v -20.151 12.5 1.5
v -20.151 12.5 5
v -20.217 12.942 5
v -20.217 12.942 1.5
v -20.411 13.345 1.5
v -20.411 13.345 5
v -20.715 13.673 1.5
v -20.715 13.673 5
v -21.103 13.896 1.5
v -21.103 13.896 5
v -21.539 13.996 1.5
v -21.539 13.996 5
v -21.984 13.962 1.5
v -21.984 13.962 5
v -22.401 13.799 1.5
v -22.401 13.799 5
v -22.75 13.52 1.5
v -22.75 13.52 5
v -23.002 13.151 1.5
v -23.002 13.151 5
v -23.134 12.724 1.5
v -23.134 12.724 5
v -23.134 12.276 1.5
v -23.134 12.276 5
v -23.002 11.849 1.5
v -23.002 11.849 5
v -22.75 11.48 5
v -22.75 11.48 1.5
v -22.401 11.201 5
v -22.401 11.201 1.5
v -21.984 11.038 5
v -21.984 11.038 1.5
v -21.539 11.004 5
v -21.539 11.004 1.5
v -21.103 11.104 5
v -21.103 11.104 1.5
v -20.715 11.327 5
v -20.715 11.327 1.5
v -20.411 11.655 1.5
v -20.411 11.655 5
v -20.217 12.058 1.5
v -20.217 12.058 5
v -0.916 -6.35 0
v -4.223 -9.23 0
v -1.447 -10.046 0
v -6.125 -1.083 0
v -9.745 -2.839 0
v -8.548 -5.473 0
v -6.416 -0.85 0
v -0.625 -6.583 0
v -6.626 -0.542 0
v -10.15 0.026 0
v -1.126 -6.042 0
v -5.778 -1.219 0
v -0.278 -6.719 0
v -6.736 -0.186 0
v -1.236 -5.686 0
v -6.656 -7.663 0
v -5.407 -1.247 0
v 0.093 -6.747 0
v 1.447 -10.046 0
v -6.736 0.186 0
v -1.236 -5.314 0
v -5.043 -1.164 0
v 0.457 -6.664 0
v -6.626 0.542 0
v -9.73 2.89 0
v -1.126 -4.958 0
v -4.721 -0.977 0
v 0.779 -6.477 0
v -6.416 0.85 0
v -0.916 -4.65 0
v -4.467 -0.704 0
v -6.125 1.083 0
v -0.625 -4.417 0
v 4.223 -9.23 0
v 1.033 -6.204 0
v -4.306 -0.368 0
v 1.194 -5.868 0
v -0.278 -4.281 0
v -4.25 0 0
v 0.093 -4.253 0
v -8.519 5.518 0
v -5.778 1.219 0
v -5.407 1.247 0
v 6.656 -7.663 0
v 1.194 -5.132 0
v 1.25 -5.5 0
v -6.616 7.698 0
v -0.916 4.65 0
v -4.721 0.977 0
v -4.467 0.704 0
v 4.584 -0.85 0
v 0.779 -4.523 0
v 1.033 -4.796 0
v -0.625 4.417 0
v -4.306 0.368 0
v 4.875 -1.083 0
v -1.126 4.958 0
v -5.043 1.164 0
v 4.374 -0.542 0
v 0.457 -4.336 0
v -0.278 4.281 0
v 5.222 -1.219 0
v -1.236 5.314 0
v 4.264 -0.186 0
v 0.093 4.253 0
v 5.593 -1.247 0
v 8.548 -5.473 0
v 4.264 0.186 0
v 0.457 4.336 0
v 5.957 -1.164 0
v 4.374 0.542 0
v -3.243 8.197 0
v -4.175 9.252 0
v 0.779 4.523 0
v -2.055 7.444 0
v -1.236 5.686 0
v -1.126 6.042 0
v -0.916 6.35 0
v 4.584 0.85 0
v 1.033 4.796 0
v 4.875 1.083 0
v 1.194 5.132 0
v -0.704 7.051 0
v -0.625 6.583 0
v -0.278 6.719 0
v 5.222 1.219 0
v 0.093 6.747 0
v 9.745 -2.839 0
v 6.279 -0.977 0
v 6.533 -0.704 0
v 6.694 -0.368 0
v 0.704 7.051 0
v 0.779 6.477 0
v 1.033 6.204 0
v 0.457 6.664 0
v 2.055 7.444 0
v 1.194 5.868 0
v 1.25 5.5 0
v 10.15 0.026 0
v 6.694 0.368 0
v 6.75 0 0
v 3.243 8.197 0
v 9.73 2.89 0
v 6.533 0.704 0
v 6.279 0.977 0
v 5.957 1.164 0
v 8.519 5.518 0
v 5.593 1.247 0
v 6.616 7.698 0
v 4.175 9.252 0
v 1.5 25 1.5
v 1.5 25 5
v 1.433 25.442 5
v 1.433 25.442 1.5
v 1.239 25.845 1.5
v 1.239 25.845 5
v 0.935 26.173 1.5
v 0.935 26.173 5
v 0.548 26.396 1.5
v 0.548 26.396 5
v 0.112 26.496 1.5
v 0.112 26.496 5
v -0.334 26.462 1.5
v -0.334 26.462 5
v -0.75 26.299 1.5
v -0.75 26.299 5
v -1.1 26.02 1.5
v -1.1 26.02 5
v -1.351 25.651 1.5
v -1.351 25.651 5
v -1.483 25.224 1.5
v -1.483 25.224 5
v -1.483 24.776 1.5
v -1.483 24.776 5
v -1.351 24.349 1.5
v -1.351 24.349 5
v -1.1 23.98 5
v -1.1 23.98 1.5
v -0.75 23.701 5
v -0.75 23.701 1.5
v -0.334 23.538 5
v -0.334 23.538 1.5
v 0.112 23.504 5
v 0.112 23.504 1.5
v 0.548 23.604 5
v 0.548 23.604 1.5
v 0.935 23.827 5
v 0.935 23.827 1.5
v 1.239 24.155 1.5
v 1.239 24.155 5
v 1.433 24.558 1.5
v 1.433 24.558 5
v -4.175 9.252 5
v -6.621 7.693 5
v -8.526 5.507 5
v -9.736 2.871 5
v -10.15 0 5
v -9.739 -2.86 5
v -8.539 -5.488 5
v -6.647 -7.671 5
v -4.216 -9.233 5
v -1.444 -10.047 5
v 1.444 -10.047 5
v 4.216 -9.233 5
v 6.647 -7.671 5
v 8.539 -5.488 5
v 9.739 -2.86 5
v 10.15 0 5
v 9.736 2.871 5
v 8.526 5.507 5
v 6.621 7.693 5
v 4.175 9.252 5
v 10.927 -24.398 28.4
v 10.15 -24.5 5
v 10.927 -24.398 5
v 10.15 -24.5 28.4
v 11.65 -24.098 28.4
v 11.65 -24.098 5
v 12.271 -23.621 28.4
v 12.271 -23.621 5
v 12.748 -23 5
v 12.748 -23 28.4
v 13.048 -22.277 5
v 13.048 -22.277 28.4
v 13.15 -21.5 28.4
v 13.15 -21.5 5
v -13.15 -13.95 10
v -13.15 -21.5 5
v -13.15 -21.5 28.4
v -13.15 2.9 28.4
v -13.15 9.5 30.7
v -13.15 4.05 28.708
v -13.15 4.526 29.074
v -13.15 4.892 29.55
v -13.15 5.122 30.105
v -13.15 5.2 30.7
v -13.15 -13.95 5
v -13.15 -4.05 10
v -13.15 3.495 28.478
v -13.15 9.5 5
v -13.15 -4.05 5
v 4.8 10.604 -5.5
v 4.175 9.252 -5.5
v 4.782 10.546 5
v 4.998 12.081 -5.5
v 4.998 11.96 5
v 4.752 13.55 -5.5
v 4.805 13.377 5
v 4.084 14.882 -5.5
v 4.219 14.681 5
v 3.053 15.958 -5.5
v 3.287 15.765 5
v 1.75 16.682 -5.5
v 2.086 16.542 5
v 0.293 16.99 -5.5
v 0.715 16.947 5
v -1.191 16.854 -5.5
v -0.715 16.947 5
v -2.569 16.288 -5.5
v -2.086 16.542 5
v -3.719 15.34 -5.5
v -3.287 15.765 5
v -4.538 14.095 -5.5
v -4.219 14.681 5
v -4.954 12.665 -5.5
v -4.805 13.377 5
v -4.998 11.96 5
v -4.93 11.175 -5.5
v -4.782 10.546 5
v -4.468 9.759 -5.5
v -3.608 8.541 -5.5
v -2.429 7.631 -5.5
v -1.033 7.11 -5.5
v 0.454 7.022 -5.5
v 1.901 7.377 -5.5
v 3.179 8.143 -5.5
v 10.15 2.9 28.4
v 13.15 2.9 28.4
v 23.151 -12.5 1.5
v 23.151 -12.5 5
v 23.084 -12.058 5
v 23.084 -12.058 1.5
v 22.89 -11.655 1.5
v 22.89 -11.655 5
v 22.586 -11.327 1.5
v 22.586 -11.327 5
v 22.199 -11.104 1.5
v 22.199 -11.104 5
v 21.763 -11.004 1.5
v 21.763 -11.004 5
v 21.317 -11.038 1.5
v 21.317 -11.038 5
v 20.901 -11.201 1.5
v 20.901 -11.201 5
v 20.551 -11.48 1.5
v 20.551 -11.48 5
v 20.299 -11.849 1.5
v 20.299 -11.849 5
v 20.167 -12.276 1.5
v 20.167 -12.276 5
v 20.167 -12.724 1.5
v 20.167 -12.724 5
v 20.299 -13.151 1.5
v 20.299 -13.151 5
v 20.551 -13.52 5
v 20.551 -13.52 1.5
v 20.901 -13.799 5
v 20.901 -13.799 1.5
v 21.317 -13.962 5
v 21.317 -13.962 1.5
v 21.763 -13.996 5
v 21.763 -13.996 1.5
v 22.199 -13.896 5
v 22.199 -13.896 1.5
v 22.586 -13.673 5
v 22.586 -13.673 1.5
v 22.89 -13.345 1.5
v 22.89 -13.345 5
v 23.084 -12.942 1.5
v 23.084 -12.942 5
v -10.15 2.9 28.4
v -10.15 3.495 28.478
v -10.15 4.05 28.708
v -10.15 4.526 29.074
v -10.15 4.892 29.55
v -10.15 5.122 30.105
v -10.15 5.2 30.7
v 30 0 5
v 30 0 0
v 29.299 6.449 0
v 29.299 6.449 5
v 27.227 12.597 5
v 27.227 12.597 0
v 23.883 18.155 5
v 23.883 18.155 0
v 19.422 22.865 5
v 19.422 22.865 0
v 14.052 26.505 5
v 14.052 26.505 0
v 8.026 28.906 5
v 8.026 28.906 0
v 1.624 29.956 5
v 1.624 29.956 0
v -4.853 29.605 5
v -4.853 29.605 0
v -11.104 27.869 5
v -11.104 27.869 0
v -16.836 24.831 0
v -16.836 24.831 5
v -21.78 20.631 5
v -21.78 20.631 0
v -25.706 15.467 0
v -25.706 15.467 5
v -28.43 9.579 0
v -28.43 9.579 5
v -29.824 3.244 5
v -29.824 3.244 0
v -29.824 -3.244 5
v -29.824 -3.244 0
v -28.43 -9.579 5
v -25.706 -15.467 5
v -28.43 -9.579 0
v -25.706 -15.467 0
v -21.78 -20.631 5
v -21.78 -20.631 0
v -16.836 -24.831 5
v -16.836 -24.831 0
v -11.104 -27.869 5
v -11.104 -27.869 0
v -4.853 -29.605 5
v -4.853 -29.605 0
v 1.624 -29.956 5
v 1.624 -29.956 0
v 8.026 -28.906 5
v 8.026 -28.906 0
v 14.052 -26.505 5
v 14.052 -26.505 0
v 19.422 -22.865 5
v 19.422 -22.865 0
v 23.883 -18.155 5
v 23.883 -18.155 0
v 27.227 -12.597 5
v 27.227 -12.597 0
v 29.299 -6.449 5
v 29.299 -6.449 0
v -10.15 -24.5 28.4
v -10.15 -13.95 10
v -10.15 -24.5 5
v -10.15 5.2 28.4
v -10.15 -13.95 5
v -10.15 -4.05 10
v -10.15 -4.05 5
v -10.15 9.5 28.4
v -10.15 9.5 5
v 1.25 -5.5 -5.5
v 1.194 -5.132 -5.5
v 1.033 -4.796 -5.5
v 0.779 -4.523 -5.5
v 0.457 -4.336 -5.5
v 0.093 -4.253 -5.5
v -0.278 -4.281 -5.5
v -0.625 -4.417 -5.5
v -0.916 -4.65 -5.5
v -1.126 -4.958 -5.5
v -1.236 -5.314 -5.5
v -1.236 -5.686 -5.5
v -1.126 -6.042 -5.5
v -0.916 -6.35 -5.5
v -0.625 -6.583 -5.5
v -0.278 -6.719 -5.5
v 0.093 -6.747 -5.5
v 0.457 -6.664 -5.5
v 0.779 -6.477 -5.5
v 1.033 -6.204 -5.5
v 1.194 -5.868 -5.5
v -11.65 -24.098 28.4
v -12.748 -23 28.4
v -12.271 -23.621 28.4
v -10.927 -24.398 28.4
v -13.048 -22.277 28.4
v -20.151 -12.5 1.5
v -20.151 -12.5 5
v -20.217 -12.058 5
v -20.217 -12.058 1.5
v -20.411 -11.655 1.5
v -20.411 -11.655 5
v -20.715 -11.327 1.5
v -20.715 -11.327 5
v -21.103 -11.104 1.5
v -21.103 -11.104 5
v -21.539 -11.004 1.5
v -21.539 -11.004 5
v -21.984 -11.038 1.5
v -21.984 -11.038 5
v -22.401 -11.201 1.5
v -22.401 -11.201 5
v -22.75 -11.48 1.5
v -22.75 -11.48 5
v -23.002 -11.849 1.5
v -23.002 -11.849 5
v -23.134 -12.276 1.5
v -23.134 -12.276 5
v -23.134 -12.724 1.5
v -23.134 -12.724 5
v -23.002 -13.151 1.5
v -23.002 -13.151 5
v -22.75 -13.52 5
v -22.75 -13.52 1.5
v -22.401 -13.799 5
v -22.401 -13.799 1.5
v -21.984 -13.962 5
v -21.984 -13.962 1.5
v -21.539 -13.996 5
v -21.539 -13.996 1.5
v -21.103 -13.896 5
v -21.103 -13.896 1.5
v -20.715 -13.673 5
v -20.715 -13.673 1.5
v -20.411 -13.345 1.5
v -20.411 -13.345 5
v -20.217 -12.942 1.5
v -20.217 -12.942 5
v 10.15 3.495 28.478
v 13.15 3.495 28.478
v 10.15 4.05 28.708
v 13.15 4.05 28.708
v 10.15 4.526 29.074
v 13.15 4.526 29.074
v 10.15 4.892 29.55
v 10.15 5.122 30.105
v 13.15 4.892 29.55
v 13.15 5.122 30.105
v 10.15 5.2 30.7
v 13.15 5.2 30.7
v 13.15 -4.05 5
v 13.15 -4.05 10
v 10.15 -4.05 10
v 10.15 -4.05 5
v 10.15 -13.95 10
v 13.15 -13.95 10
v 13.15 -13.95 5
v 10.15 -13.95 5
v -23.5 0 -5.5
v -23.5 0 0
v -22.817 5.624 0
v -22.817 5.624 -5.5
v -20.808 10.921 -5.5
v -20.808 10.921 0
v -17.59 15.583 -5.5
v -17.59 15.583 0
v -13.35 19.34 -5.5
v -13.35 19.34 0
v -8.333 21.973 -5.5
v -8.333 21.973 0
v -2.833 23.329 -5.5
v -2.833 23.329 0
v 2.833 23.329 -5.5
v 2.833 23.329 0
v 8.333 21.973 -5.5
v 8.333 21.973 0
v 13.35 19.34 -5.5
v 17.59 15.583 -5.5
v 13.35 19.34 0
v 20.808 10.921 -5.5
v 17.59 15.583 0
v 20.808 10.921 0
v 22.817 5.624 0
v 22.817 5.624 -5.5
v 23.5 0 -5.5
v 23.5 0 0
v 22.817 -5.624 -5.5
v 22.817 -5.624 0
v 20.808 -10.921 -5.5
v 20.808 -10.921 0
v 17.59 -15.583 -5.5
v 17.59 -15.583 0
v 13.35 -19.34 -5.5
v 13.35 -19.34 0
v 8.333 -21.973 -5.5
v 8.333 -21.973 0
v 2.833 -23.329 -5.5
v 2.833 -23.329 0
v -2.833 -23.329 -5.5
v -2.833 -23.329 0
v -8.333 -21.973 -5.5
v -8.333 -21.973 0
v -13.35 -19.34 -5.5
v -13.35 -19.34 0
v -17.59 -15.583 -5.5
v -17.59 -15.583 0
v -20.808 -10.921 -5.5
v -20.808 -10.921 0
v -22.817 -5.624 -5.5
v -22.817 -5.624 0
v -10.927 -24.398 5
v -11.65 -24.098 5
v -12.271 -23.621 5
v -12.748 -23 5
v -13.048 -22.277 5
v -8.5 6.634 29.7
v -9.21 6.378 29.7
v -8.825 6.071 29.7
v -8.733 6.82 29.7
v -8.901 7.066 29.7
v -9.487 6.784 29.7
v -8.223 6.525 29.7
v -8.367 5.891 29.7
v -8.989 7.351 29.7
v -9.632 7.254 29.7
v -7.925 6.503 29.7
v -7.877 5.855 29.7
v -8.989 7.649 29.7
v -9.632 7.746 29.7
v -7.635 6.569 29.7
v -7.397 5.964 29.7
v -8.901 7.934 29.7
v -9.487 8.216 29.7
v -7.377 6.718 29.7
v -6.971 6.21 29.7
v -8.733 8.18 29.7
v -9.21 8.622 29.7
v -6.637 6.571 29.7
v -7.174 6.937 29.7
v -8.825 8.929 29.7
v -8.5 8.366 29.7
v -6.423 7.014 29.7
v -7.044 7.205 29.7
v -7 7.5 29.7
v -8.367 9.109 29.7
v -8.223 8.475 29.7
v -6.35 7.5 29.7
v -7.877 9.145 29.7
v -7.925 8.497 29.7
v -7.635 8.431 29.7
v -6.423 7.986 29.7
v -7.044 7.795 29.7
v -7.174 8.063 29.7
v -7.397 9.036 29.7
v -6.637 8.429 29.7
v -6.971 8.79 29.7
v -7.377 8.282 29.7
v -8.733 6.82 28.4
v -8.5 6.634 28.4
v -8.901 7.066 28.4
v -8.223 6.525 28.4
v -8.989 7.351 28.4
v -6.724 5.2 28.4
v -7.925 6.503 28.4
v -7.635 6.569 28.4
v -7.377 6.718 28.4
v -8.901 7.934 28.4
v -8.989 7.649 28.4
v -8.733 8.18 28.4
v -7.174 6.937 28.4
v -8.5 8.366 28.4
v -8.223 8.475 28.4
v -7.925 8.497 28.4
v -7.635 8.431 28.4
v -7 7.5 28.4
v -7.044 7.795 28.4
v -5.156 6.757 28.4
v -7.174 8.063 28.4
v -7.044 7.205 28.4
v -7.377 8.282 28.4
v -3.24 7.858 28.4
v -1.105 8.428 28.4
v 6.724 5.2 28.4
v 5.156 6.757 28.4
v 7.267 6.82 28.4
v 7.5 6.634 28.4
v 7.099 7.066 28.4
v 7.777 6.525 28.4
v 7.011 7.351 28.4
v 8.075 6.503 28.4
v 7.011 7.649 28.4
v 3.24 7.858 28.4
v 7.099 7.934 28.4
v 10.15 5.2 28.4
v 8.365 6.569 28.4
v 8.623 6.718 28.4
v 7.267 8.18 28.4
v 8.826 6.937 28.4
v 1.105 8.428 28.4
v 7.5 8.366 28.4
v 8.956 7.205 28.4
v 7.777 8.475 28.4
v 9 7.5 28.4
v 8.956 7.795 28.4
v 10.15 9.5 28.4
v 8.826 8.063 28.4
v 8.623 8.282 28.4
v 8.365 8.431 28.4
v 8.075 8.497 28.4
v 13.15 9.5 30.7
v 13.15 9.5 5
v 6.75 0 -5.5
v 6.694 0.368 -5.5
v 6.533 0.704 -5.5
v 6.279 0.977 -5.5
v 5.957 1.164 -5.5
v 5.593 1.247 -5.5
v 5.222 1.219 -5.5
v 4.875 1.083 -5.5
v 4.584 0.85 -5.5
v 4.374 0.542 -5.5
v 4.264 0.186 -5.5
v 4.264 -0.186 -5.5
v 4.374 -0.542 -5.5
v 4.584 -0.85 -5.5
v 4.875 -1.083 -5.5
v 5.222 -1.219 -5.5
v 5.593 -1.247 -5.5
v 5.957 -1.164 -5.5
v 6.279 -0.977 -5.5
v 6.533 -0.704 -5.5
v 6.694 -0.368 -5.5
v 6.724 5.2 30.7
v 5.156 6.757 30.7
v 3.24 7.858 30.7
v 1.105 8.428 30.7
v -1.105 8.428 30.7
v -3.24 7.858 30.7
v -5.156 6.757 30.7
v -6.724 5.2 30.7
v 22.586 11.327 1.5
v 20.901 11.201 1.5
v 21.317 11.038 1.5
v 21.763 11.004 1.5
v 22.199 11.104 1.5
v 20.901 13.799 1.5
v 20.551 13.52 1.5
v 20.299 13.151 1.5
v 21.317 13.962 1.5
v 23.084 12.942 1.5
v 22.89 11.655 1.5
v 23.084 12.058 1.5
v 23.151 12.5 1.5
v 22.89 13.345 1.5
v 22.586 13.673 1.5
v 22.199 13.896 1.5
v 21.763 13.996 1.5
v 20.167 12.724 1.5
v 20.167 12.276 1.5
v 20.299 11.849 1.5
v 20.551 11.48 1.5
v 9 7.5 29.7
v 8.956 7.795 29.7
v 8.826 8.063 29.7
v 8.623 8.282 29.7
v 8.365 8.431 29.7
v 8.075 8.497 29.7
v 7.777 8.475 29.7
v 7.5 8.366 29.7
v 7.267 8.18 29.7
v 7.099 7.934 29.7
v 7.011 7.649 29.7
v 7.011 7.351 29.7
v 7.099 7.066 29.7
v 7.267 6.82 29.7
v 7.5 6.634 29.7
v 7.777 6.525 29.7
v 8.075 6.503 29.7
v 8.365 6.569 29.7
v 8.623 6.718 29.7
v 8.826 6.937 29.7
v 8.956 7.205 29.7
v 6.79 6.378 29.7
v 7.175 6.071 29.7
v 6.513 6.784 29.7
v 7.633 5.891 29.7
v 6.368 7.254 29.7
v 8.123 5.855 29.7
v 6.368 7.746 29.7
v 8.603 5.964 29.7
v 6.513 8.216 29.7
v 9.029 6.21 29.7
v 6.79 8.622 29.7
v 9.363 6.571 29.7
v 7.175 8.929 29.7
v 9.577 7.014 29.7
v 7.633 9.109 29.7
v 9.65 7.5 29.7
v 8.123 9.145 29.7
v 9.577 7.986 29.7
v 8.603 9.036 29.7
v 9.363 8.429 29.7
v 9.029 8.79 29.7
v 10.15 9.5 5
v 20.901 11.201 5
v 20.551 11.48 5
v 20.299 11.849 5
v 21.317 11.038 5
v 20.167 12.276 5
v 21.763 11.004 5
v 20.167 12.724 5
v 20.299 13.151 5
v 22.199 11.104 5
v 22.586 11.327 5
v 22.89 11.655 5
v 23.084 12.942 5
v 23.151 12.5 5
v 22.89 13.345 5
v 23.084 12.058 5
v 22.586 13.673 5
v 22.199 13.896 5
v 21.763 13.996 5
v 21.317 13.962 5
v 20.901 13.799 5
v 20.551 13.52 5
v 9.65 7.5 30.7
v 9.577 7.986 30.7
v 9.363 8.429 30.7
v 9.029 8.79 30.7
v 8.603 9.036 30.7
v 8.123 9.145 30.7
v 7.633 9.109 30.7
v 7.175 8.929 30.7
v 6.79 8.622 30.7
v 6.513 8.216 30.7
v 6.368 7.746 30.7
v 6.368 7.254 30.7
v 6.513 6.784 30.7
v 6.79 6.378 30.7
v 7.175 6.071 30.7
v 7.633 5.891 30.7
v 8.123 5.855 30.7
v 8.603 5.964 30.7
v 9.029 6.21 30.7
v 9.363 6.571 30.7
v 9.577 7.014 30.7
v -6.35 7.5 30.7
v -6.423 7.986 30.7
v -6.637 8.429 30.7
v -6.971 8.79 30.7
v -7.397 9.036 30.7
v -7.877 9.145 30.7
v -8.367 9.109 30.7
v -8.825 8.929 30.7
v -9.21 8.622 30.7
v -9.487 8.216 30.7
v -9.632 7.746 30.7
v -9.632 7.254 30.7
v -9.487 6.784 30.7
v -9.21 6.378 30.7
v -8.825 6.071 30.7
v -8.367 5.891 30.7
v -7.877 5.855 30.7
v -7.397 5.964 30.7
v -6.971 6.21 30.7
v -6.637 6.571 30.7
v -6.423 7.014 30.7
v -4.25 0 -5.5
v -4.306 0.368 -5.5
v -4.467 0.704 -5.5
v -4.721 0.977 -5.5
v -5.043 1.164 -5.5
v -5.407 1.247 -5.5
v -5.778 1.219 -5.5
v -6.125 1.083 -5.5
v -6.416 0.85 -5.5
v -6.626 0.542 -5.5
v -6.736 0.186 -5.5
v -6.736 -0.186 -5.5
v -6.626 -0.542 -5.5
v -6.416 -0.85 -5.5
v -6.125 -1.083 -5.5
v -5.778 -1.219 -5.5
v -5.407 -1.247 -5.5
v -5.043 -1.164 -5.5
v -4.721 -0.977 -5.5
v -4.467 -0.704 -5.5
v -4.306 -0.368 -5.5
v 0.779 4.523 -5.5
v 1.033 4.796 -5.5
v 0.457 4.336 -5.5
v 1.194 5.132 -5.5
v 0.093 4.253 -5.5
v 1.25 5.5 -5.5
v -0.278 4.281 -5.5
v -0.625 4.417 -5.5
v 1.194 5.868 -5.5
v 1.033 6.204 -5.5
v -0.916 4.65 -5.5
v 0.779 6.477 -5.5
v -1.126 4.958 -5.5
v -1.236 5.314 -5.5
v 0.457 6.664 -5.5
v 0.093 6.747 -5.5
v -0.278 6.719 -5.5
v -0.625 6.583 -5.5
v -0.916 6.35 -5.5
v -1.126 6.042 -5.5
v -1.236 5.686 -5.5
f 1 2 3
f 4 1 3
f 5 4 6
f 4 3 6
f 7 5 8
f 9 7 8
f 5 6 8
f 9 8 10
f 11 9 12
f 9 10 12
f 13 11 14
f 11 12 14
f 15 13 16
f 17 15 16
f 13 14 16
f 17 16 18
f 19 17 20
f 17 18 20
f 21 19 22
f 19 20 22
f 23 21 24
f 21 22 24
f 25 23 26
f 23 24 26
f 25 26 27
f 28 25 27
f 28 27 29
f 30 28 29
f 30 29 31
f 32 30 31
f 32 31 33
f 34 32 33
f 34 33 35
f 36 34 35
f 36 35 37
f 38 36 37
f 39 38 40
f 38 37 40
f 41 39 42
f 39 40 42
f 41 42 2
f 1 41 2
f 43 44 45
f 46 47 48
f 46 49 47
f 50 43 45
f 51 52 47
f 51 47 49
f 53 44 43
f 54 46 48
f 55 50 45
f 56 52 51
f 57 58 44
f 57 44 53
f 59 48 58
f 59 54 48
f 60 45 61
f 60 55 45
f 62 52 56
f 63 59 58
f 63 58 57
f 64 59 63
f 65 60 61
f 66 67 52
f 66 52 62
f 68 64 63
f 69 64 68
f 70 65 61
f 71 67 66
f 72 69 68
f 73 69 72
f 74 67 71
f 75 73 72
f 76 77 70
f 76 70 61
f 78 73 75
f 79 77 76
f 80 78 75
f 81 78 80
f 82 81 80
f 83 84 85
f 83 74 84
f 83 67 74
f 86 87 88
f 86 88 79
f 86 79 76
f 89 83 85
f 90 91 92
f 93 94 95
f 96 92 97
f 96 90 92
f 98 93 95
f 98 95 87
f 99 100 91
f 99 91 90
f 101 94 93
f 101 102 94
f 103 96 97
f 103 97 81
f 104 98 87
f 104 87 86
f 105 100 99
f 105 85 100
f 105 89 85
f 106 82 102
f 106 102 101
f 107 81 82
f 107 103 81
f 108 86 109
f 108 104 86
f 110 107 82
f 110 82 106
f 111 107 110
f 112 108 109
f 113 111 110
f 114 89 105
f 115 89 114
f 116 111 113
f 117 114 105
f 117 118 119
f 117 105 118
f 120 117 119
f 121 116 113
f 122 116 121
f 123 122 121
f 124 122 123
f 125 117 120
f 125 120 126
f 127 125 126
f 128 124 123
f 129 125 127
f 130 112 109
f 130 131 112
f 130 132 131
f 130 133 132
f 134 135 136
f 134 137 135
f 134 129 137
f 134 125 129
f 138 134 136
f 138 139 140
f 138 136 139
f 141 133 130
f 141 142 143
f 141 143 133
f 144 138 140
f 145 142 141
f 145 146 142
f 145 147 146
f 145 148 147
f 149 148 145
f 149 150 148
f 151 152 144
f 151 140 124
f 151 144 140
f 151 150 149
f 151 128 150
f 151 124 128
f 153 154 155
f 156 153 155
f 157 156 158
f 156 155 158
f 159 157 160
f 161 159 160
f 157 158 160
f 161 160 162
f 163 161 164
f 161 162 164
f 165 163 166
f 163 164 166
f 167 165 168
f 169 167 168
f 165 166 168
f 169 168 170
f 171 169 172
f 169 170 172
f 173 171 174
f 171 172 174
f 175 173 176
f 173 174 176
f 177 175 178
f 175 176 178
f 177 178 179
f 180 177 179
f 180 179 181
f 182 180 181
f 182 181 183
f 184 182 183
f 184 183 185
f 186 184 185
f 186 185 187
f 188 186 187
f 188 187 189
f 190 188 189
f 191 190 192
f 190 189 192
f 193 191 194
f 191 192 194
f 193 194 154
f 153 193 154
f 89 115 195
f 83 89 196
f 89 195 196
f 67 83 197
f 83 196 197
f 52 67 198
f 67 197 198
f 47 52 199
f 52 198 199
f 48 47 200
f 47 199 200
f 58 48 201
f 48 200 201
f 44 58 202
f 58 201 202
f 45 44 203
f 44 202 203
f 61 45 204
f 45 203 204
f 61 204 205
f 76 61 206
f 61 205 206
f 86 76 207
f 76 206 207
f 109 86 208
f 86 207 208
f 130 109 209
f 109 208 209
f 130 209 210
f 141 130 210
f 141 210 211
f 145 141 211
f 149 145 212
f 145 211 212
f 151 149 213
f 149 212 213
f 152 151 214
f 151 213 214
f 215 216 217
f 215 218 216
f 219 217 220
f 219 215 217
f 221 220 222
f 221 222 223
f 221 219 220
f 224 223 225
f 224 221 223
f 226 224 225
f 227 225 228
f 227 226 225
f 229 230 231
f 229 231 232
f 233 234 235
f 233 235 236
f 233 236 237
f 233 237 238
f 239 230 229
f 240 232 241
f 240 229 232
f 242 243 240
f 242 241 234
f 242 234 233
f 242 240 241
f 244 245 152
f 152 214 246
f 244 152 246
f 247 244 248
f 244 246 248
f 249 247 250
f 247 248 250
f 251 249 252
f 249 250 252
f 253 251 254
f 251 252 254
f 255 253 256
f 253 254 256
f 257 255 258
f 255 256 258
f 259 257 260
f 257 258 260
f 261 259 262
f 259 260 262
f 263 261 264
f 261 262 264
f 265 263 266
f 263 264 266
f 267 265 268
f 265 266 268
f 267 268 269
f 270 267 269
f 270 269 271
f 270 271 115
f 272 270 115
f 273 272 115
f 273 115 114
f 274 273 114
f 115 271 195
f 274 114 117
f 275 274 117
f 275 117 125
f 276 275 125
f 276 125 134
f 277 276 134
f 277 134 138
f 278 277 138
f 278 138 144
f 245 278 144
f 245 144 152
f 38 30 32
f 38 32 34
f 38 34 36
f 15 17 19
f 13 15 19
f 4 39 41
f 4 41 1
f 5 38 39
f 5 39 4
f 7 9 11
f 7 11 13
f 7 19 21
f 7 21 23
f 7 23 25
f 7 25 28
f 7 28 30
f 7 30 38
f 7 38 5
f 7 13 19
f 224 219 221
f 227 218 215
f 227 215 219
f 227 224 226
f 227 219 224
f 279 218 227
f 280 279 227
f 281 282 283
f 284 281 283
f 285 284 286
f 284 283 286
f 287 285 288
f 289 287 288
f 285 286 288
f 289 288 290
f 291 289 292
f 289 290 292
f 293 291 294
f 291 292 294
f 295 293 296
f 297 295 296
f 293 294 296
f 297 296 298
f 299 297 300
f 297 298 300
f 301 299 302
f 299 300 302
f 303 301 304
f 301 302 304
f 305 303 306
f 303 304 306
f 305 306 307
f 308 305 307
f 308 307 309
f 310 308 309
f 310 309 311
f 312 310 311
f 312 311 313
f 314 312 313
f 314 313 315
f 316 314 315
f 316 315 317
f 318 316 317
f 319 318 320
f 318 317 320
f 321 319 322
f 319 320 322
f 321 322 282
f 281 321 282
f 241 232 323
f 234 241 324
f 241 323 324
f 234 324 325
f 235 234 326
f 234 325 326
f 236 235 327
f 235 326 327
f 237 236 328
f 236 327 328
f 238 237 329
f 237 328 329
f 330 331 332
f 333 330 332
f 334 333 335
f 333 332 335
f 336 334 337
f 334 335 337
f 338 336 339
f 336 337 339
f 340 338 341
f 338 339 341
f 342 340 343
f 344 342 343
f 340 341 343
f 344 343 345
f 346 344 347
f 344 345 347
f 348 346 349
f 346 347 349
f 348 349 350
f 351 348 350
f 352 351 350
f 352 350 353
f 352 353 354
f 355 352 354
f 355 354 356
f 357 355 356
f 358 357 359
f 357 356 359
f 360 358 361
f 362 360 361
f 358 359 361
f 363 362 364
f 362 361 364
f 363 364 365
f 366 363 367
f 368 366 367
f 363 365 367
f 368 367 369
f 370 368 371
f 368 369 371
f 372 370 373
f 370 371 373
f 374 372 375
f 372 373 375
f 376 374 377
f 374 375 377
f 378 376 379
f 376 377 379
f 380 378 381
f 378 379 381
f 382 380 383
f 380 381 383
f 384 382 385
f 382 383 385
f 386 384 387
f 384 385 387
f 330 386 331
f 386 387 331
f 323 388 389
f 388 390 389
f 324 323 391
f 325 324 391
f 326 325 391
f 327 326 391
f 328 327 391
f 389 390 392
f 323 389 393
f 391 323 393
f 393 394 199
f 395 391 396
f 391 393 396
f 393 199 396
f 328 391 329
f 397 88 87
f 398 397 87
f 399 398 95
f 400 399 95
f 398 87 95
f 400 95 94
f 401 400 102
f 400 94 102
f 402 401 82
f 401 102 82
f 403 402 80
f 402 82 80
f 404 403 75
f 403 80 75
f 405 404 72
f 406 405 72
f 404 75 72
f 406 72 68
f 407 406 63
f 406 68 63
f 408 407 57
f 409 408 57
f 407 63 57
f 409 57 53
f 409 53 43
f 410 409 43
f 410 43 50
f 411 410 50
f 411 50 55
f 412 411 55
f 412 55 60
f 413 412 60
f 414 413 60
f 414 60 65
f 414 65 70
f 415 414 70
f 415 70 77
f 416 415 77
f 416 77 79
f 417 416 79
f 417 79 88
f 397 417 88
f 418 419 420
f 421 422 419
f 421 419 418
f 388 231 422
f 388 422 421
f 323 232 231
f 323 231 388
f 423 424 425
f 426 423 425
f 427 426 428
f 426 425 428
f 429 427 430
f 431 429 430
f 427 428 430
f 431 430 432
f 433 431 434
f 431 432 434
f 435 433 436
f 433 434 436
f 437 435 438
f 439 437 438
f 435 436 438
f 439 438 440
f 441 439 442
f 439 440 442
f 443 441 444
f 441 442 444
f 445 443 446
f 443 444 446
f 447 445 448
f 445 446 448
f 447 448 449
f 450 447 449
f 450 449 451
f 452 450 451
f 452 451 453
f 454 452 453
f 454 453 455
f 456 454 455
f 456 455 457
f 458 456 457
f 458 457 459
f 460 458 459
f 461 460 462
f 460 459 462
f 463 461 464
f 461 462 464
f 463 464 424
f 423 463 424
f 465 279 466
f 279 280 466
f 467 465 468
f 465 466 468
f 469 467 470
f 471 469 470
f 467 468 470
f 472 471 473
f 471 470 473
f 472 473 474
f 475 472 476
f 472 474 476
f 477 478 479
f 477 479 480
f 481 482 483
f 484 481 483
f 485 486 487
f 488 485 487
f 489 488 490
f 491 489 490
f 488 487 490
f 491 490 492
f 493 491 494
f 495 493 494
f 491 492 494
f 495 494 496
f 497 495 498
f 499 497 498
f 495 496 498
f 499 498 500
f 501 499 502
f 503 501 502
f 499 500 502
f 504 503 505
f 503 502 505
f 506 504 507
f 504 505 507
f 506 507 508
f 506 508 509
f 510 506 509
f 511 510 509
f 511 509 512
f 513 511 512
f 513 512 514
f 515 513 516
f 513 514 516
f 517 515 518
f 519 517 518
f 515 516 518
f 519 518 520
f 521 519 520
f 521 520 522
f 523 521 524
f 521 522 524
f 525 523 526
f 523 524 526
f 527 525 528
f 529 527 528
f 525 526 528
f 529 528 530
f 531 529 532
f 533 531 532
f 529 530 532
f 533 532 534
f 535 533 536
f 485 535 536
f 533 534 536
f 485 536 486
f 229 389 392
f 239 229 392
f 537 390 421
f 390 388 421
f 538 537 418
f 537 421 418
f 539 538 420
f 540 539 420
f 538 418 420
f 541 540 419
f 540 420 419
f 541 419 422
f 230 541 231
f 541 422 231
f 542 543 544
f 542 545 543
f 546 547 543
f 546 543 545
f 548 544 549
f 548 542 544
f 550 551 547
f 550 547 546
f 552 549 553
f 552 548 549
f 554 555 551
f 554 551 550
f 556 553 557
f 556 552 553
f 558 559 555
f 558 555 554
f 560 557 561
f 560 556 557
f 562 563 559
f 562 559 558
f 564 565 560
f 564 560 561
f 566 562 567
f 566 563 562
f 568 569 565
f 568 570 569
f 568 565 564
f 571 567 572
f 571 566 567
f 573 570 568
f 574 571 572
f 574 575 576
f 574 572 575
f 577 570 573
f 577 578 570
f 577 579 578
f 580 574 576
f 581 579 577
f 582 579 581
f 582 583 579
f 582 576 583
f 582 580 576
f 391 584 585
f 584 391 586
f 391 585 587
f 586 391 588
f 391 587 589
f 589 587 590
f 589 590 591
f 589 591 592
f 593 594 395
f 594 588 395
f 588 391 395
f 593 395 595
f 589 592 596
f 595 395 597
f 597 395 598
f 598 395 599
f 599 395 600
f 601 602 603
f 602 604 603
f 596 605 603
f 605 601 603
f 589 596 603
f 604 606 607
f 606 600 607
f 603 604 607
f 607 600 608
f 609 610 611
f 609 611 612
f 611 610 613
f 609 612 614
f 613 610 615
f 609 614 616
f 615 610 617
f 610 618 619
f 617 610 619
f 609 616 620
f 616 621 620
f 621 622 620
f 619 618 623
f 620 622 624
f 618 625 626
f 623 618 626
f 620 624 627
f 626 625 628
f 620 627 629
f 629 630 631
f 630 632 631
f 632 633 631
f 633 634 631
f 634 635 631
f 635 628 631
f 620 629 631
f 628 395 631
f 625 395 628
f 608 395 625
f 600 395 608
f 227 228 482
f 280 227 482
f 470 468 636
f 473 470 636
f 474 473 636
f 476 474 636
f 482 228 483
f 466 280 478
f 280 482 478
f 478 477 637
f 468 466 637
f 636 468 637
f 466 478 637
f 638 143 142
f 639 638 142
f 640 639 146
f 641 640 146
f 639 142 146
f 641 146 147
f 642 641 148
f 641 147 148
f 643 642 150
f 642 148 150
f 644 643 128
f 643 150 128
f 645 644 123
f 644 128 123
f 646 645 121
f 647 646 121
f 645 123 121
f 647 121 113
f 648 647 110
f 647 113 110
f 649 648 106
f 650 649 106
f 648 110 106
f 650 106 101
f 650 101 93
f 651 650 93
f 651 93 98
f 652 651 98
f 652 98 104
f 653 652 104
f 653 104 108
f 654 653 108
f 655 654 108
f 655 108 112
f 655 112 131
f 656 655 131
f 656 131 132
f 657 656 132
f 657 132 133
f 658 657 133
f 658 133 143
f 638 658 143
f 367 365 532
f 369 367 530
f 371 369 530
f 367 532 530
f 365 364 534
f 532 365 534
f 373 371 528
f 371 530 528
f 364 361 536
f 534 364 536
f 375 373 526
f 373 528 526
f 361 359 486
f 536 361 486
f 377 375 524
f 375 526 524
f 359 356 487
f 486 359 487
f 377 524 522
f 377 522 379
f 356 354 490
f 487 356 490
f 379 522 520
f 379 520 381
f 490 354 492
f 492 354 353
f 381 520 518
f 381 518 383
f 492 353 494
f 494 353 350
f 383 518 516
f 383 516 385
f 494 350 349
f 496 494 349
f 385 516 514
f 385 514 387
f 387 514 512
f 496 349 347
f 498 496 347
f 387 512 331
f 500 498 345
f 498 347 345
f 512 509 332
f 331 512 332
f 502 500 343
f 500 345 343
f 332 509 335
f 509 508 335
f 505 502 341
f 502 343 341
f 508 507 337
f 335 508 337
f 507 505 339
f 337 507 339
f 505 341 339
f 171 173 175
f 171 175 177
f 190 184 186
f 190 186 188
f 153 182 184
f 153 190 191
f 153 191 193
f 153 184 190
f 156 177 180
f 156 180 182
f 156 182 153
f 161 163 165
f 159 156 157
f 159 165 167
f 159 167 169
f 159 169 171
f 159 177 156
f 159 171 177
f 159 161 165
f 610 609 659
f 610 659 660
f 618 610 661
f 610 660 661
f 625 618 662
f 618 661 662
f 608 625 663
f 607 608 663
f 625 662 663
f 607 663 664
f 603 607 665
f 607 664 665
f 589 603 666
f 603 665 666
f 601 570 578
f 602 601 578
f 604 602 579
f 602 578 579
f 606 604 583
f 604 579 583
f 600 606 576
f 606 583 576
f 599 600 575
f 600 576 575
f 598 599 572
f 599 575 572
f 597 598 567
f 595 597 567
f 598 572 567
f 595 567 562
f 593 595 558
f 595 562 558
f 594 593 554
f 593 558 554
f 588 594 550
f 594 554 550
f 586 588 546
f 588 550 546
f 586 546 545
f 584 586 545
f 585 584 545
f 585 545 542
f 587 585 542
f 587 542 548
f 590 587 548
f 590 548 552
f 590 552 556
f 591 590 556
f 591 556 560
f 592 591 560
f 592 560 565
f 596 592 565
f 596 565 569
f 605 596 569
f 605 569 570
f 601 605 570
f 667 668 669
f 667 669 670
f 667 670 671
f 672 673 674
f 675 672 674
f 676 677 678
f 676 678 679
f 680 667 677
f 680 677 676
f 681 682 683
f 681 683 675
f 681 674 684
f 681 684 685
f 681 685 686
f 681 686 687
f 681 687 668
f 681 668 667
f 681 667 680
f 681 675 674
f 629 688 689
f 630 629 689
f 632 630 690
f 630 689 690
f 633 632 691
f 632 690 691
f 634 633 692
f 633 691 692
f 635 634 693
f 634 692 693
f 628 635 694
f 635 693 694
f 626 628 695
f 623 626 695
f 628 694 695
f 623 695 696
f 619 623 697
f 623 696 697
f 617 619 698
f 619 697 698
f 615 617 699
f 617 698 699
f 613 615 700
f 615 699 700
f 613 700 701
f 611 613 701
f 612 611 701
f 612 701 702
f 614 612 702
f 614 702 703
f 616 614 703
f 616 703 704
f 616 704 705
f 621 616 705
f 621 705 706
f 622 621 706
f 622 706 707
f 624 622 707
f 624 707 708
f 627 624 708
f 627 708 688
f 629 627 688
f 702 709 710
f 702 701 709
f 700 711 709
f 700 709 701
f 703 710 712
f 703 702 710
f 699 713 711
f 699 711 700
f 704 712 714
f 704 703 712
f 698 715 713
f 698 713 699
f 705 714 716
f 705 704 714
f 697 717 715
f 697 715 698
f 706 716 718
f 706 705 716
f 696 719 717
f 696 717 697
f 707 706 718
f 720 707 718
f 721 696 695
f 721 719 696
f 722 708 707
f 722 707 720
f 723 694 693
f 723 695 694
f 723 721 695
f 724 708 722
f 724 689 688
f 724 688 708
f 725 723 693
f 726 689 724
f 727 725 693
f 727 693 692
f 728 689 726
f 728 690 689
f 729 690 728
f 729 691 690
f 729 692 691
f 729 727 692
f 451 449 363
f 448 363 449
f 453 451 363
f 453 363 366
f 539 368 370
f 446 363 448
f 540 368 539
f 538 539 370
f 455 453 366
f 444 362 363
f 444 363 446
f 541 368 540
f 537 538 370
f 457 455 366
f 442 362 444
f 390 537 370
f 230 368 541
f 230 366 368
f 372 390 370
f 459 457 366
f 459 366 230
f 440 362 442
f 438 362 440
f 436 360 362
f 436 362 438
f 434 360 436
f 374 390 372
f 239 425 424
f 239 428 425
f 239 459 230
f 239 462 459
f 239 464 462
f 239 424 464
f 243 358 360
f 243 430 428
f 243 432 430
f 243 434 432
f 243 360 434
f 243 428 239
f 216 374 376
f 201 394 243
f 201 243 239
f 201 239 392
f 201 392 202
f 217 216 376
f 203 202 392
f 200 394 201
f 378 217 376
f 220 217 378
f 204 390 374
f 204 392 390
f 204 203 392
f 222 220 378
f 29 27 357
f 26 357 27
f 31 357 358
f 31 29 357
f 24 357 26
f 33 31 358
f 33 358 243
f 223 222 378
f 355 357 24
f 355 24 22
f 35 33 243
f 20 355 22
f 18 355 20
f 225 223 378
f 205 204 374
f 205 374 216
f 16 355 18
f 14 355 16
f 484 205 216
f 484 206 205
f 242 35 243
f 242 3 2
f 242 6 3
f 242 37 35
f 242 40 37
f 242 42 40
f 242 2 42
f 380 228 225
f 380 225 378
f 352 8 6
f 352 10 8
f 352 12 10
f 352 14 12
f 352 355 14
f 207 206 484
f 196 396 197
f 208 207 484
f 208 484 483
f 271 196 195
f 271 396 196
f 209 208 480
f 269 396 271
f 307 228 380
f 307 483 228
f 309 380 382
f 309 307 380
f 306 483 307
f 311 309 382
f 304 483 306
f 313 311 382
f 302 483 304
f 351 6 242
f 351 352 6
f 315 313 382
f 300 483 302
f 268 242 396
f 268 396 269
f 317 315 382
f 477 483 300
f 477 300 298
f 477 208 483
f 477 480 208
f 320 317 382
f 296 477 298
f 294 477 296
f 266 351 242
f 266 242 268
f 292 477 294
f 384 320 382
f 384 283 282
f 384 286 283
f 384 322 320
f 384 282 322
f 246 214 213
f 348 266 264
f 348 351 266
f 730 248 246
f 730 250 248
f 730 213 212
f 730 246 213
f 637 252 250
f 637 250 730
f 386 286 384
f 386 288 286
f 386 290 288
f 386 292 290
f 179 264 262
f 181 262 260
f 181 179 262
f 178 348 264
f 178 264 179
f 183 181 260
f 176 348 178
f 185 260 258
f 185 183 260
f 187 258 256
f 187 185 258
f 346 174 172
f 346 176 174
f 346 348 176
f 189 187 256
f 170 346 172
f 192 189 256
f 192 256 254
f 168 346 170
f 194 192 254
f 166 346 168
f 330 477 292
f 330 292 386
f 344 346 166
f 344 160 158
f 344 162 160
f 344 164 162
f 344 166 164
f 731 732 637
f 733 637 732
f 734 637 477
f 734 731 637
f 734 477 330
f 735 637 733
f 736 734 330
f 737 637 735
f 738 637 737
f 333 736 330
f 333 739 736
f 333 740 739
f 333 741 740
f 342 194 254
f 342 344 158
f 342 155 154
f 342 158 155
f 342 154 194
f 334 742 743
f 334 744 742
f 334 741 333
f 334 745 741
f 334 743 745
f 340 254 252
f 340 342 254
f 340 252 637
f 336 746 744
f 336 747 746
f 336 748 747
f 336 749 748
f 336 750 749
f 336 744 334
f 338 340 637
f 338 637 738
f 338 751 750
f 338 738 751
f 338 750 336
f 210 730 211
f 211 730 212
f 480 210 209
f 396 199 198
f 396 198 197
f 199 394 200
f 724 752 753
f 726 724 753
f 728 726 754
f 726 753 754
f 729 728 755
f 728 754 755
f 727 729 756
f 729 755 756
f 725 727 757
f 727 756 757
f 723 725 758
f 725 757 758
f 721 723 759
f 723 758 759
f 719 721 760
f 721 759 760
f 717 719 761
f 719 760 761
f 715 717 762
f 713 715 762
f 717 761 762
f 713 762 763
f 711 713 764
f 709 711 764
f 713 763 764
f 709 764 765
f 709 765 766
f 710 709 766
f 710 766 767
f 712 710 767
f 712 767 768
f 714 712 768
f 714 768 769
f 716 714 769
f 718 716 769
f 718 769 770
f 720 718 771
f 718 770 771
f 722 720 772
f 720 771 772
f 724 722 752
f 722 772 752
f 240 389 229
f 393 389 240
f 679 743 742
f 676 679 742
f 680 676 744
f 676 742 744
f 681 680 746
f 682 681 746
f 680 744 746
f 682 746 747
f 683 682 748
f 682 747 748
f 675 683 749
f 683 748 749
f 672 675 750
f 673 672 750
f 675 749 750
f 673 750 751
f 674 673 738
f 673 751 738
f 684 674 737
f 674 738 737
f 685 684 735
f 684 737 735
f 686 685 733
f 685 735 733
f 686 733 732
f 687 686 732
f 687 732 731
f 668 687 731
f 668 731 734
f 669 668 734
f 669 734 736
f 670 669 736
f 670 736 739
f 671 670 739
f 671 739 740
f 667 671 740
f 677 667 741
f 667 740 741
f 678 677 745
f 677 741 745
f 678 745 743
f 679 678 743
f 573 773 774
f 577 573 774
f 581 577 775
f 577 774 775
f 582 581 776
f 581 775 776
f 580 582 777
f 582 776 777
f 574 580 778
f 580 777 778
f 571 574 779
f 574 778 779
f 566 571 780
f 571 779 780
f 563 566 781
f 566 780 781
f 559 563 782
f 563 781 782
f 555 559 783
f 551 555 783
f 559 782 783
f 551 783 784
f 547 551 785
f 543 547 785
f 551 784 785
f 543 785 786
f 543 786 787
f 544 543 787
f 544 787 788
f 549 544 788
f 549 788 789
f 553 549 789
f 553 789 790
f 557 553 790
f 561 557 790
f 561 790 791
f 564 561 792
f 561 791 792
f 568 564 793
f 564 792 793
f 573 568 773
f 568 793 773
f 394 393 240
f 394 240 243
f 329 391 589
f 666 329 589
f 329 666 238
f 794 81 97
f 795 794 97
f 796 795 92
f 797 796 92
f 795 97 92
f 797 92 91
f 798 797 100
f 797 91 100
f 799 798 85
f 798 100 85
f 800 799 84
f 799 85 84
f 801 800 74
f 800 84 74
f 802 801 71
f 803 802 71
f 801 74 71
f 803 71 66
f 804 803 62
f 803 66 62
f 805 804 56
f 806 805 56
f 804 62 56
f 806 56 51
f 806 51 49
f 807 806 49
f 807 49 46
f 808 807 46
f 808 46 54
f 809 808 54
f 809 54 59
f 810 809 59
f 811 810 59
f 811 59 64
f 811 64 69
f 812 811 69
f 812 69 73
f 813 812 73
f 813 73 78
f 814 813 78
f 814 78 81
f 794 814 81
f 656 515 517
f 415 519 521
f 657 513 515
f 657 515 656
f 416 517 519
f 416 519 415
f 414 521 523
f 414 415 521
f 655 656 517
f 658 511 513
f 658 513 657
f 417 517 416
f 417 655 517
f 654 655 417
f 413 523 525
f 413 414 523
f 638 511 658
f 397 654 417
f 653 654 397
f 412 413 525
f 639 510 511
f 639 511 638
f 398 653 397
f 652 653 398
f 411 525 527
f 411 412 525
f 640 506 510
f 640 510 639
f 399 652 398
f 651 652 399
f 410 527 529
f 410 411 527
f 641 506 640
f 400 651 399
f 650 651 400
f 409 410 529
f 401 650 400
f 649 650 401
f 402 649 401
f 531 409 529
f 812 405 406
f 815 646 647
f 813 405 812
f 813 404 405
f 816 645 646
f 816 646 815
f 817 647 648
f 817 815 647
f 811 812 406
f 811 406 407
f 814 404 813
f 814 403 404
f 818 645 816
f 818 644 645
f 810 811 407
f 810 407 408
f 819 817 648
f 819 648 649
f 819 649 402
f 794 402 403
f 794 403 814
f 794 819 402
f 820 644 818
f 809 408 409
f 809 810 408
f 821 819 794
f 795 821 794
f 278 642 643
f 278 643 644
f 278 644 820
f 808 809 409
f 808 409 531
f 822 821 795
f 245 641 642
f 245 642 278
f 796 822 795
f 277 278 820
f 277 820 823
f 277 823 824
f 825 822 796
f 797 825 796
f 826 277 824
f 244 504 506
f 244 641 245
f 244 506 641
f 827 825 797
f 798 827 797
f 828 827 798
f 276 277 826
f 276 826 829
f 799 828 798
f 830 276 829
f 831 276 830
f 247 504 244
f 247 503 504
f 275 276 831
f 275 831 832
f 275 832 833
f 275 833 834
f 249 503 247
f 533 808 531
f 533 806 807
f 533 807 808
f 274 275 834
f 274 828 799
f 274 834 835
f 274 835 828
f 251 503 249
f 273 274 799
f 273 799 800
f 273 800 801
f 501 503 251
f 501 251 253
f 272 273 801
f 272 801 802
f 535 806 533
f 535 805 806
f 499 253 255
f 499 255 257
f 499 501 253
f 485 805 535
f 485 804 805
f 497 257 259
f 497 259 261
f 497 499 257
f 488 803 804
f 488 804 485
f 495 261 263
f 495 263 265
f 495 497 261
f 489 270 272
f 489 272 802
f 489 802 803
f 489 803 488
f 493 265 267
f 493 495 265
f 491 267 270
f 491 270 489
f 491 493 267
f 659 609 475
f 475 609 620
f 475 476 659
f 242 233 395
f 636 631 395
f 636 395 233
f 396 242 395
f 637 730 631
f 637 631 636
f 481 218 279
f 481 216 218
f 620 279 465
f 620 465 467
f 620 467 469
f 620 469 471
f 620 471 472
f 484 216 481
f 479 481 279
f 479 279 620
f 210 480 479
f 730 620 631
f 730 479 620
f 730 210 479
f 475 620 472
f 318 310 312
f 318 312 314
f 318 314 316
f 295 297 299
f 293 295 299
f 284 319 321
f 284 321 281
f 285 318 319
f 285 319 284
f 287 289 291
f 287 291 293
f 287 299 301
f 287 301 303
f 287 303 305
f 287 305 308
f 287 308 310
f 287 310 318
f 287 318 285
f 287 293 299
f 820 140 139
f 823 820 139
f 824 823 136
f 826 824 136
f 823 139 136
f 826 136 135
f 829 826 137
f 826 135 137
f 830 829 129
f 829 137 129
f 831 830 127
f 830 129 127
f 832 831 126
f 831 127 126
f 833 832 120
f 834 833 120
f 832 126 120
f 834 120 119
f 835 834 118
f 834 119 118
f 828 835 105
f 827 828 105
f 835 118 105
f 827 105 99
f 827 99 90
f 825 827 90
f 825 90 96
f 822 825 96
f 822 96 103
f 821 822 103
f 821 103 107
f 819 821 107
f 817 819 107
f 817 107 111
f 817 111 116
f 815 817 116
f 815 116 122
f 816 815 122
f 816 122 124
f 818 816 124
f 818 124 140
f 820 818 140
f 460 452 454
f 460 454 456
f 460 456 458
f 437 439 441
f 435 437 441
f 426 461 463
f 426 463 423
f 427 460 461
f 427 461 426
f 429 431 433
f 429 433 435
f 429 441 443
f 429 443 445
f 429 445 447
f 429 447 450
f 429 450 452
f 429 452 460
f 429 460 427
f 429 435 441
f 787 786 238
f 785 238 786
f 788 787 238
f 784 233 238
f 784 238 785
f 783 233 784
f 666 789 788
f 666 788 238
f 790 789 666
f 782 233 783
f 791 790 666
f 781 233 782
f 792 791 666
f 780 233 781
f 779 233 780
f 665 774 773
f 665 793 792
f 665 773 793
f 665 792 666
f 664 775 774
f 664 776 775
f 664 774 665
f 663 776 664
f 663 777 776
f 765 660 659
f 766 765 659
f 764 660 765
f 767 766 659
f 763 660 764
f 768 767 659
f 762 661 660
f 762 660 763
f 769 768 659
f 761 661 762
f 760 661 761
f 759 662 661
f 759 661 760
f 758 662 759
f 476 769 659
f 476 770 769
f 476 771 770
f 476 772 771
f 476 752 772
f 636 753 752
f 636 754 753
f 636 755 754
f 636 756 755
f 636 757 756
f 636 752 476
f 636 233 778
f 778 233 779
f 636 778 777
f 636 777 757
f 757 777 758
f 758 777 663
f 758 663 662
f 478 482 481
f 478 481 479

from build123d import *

# Parameters (mm, degrees)
CROQUIS2_R              = 30
SALIENTE_EXTRUIR1_DEPTH = 5
CROQUIS6_R              = 23.5
SALIENTE_EXTRUIR5_DEPTH = 5.5
CROQUIS7_W              = 3
CROQUIS7_H              = 34
SALIENTE_EXTRUIR6_DEPTH = 23.4
REDONDEO1_R             = 3
CROQUIS8_R              = 10.15
CORTAR_EXTRUIR1_DEPTH   = 5
CORTAR_EXTRUIR2_REACH   = 53.054
CROQUIS9_R              = 1.25
CROQUIS10_R             = 1.5
CORTAR_EXTRUIR3_DEPTH   = 3.5
CORTAR_EXTRUIR4_REACH   = 50.452
CROQUIS11_R             = 4.998325146
CORTAR_EXTRUIR5_REACH   = 61.737
CROQUIS12_W             = 5
CROQUIS12_H             = 9.9
CROQUIS13_W             = 26.3
CROQUIS13_H             = 4.3
SALIENTE_EXTRUIR7_DEPTH = 2.3
REDONDEO2_R             = 2.3
CORTAR_EXTRUIR6_DEPTH   = 2.3
CROQUIS16_R             = 1
CORTAR_EXTRUIR7_DEPTH   = 2.3
CROQUIS17_R             = 1.65
CORTAR_EXTRUIR8_DEPTH   = 1


with BuildPart() as part:
    # Croquis2 → Saliente-Extruir1 (new body)
    with BuildSketch(Plane.XY):
        Circle(CROQUIS2_R)
    extrude(amount=SALIENTE_EXTRUIR1_DEPTH)

    # Croquis6 → Saliente-Extruir5 (add)
    with BuildSketch(Plane(origin=(0, 0, 0), x_dir=(-1, 0, 0), z_dir=(0, 0, -1))):
        Circle(CROQUIS6_R)
    extrude(amount=SALIENTE_EXTRUIR5_DEPTH)

    # Croquis7 → Saliente-Extruir6 (add)
    with BuildSketch(Plane.XY.offset(5)):
        with Locations((-11.65, -7.5)):
            Rectangle(CROQUIS7_W, CROQUIS7_H)
        with Locations((11.65, -7.5)):
            Rectangle(CROQUIS7_W, CROQUIS7_H)
    extrude(amount=SALIENTE_EXTRUIR6_DEPTH)

    # Redondeo1
    redondeo1_edges = [part.edges().sort_by_distance(p)[0] for p in [
        (13.15, -24.5, 16.7),
        (-13.15, -24.5, 16.7),
    ]]
    fillet(redondeo1_edges, radius=REDONDEO1_R - 0.0001)  # a hair under: the kernel refuses the full size

    # Croquis8 → Cortar-Extruir1 (cut)
    with BuildSketch(Plane.XY.offset(5)):
        Circle(CROQUIS8_R)
    extrude(amount=-CORTAR_EXTRUIR1_DEPTH, mode=Mode.SUBTRACT)

    # Croquis9 → Cortar-Extruir2 (cut, up to next)
    with BuildSketch(Plane.XY, mode=Mode.PRIVATE) as cortar_extruir2_sk1:
        with Locations((0, 5.5)):
            Circle(CROQUIS9_R)
    cortar_extruir2_tool1 = extrude(cortar_extruir2_sk1.sketch, amount=-CORTAR_EXTRUIR2_REACH, mode=Mode.PRIVATE) & part.part
    # Croquis9 → Cortar-Extruir2 (cut, up to next)
    with BuildSketch(Plane.XY, mode=Mode.PRIVATE) as cortar_extruir2_sk2:
        with Locations((5.5, 0)):
            Circle(CROQUIS9_R)
    cortar_extruir2_tool2 = extrude(cortar_extruir2_sk2.sketch, amount=-CORTAR_EXTRUIR2_REACH, mode=Mode.PRIVATE) & part.part
    # Croquis9 → Cortar-Extruir2 (cut, up to next)
    with BuildSketch(Plane.XY, mode=Mode.PRIVATE) as cortar_extruir2_sk3:
        with Locations((0, -5.5)):
            Circle(CROQUIS9_R)
    cortar_extruir2_tool3 = extrude(cortar_extruir2_sk3.sketch, amount=-CORTAR_EXTRUIR2_REACH, mode=Mode.PRIVATE) & part.part
    # Croquis9 → Cortar-Extruir2 (cut, up to next)
    with BuildSketch(Plane.XY, mode=Mode.PRIVATE) as cortar_extruir2_sk4:
        with Locations((-5.5, 0)):
            Circle(CROQUIS9_R)
    cortar_extruir2_tool4 = extrude(cortar_extruir2_sk4.sketch, amount=-CORTAR_EXTRUIR2_REACH, mode=Mode.PRIVATE) & part.part
    add(cortar_extruir2_tool1.solids().sort_by_distance((0, 5.5, 0))[0], mode=Mode.SUBTRACT)
    add(cortar_extruir2_tool2.solids().sort_by_distance((5.5, 0, 0))[0], mode=Mode.SUBTRACT)
    add(cortar_extruir2_tool3.solids().sort_by_distance((0, -5.5, 0))[0], mode=Mode.SUBTRACT)
    add(cortar_extruir2_tool4.solids().sort_by_distance((-5.5, 0, 0))[0], mode=Mode.SUBTRACT)

    # Croquis10 → Cortar-Extruir3 (cut)
    with BuildSketch(Plane.XY.offset(5)):
        with Locations((21.650635095, -12.5)):
            Circle(CROQUIS10_R)
        with Locations((-21.650635095, -12.5)):
            Circle(CROQUIS10_R)
        with Locations((21.650635095, 12.5)):
            Circle(CROQUIS10_R)
        with Locations((-21.650635095, 12.5)):
            Circle(CROQUIS10_R)
        with Locations((0, 25)):
            Circle(CROQUIS10_R)
    extrude(amount=-CORTAR_EXTRUIR3_DEPTH, mode=Mode.SUBTRACT)

    # Croquis11 → Cortar-Extruir4 (cut, up to next)
    with BuildSketch(Plane.XY.offset(5), mode=Mode.PRIVATE) as cortar_extruir4_sk1:
        with Locations(Location((0, 12, 0), (0, 0, 326.642787388))):
            Circle(CROQUIS11_R)
    cortar_extruir4_tool1 = extrude(cortar_extruir4_sk1.sketch, amount=-CORTAR_EXTRUIR4_REACH, mode=Mode.PRIVATE) & part.part
    add(cortar_extruir4_tool1.solids().sort_by_distance((0, 12, 5))[0], mode=Mode.SUBTRACT)

    # Cortar-Extruir5: up to this face of the body (flat: up to its plane)
    cortar_extruir5_end = Plane(part.part.faces().sort_by_distance((-13.15, -6.00005, 16.7))[0])
    # Croquis12 → Cortar-Extruir5 (cut, up to the picked face)
    with BuildSketch(Plane(origin=(13.15, 0, 0), x_dir=(0, 0, -1), z_dir=(1, 0, 0)), mode=Mode.PRIVATE) as cortar_extruir5_sk1:
        with Locations((-7.5, -9)):
            Rectangle(CROQUIS12_W, CROQUIS12_H)
    cortar_extruir5_tool1 = split(extrude(cortar_extruir5_sk1.sketch, amount=-CORTAR_EXTRUIR5_REACH, mode=Mode.PRIVATE), bisect_by=cortar_extruir5_end, keep=Keep.BOTH, mode=Mode.PRIVATE)
    add(cortar_extruir5_tool1.solids().sort_by(Axis((13.15, -9, 7.5), (-1, 0, 0)))[0], mode=Mode.SUBTRACT)

    # Croquis13 → Saliente-Extruir7 (add)
    with BuildSketch(Plane.XY.offset(28.4)):
        with Locations((0, 7.35)):
            Rectangle(CROQUIS13_W, CROQUIS13_H)
    extrude(amount=SALIENTE_EXTRUIR7_DEPTH)

    # Redondeo2
    redondeo2_edges = [part.edges().sort_by_distance(p)[0] for p in [
        (11.65, 5.2, 28.4),
        (-11.65, 5.2, 28.4),
    ]]
    fillet(redondeo2_edges, radius=REDONDEO2_R - 0.0001)  # a hair under: the kernel refuses the full size

    # Croquis15 → Cortar-Extruir6 (cut)
    with BuildSketch(Plane.XY.offset(30.7)):
        with BuildLine():
            Line((-7.082372484, 4.7), (7.082372484, 4.7))
            ThreePointArc((7.082372484, 4.7), (0, 8.5), (-7.082372484, 4.7))
        make_face()
    extrude(amount=-CORTAR_EXTRUIR6_DEPTH, mode=Mode.SUBTRACT)

    # Croquis16 → Cortar-Extruir7 (cut)
    with BuildSketch(Plane.XY.offset(30.7)):
        with Locations((-8, 7.5)):
            Circle(CROQUIS16_R)
        with Locations((8, 7.5)):
            Circle(CROQUIS16_R)
    extrude(amount=-CORTAR_EXTRUIR7_DEPTH, mode=Mode.SUBTRACT)

    # Croquis17 → Cortar-Extruir8 (cut)
    with BuildSketch(Plane.XY.offset(30.7)):
        with Locations((-8, 7.5)):
            Circle(CROQUIS17_R)
        with Locations((8, 7.5)):
            Circle(CROQUIS17_R)
    extrude(amount=-CORTAR_EXTRUIR8_DEPTH, mode=Mode.SUBTRACT)


solid = part.part
